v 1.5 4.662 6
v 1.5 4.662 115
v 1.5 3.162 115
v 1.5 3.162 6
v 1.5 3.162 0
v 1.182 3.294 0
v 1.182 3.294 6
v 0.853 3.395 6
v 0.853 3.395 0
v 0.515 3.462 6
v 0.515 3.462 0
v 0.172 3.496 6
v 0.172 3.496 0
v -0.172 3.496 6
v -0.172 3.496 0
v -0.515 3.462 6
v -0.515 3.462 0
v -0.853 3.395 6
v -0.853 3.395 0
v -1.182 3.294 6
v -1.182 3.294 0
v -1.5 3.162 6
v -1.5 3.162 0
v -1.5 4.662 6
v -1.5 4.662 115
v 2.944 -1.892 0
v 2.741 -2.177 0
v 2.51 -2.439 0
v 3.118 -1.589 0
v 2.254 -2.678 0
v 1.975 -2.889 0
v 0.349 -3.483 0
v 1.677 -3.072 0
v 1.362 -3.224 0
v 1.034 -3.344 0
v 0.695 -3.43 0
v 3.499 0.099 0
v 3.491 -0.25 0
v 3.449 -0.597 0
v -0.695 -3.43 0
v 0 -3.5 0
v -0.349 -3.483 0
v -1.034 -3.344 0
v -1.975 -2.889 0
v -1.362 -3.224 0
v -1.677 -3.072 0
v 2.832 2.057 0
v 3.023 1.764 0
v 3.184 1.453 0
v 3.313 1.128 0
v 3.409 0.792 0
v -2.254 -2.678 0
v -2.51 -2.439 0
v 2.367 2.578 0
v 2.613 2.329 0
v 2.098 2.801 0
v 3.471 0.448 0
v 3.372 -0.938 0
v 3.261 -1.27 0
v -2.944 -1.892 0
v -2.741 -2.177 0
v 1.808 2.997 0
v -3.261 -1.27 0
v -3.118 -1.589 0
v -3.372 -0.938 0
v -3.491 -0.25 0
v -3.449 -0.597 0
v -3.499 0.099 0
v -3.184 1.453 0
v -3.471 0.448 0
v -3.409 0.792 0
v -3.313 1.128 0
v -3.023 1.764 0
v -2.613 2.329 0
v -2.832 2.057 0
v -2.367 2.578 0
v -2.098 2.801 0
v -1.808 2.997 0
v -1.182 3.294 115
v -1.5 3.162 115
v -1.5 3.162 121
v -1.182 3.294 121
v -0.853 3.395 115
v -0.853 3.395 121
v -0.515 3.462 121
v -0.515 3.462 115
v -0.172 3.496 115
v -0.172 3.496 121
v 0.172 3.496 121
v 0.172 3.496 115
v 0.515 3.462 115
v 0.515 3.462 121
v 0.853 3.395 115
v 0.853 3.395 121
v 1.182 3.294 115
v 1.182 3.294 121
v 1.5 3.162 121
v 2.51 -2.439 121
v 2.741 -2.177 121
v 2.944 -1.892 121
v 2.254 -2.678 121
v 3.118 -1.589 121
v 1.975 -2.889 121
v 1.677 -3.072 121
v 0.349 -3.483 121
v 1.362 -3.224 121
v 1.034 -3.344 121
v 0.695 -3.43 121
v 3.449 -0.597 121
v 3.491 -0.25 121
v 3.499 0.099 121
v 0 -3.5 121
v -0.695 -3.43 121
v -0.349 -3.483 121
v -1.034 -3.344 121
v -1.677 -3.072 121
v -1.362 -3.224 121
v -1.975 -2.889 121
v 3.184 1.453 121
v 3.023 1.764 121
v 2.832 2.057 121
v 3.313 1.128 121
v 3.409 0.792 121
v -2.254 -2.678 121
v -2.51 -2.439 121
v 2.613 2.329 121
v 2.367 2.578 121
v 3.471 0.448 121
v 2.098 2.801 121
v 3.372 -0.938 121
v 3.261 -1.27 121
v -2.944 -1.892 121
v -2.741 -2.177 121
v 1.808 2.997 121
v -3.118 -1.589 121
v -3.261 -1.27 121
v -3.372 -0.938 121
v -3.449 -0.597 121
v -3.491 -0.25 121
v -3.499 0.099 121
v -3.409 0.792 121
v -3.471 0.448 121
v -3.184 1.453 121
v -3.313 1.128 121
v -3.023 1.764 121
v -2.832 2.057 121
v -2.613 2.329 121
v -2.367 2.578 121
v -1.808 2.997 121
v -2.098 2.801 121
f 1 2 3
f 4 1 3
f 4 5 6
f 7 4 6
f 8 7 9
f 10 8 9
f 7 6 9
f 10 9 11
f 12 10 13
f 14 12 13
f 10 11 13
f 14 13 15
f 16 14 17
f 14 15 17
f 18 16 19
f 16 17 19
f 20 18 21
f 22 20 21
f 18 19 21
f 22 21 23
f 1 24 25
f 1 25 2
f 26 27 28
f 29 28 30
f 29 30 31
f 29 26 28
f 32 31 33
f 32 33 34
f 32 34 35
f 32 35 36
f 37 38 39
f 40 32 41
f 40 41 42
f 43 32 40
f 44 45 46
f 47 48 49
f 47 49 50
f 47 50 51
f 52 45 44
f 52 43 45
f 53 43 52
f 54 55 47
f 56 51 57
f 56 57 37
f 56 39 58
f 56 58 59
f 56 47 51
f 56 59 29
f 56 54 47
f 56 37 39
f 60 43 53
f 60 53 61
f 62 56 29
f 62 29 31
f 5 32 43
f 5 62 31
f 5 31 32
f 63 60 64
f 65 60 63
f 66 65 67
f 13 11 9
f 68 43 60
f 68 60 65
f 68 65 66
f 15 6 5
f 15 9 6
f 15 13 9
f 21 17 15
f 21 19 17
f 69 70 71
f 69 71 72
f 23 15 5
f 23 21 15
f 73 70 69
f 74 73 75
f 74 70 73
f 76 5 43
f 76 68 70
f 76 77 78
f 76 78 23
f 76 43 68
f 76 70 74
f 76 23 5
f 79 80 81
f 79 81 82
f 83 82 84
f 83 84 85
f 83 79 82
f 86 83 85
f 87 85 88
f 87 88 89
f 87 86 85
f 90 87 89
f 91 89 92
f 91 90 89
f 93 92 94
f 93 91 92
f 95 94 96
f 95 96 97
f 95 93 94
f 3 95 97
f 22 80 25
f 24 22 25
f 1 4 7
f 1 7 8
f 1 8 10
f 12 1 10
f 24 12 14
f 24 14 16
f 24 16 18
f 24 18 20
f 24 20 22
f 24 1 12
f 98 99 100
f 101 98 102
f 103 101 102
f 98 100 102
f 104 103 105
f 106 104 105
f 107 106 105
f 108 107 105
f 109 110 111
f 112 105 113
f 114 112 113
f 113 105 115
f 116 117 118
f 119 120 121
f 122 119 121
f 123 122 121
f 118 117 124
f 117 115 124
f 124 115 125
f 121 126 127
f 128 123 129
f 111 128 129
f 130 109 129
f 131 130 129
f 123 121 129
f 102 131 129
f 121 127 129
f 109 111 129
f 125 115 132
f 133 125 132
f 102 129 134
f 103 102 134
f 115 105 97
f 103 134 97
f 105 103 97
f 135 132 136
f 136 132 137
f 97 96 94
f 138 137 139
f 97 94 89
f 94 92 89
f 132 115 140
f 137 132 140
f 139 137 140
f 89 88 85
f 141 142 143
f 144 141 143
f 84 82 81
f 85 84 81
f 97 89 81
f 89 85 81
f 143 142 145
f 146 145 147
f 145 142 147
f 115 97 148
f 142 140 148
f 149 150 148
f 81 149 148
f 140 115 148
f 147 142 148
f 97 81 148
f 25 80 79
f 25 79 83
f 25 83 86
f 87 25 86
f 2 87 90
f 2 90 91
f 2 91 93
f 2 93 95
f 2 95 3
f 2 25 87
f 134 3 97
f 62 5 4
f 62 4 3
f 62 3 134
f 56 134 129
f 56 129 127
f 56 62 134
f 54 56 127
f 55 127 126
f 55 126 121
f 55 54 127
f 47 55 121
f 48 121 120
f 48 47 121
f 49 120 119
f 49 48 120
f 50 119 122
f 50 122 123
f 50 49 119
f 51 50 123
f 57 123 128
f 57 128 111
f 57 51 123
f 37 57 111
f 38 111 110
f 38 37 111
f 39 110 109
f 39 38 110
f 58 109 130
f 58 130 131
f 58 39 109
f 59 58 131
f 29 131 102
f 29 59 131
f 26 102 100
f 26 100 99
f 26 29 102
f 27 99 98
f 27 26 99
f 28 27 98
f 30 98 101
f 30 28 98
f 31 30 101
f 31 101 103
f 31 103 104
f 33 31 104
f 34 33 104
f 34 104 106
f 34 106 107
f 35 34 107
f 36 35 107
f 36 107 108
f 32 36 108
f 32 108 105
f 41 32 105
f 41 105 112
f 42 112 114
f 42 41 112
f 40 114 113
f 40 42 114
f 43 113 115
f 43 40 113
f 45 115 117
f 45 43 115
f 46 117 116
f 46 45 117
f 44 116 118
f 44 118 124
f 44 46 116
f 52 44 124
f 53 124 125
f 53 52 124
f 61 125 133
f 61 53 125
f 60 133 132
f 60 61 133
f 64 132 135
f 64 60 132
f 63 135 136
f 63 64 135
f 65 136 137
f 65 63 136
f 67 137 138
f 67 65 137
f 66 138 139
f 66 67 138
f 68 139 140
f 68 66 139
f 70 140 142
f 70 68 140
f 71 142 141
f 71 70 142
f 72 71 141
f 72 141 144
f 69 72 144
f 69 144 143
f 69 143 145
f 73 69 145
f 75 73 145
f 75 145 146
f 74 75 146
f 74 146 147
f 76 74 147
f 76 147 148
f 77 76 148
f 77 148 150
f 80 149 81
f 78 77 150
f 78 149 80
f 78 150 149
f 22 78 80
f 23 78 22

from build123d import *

# Parameters (mm, degrees)
BOSS_EXTRU_1_DEPTH      = 121
ENL_V_START             = -6
ENL_V_MAT_EXTRU_1_DEPTH = 6
ENL_V_MAT_EXTRU_2_DEPTH = 6


with BuildPart() as part:
    # Esquisse1 → Boss.-Extru.1 (new body)
    with BuildSketch(Plane.XY):
        with BuildLine():
            Line((-1.5, 3.16227766), (-1.5, 4.66227766))
            Line((-1.5, 4.66227766), (1.5, 4.66227766))
            Line((1.5, 4.66227766), (1.5, 3.16227766))
            ThreePointArc((1.5, 3.16227766), (0, -3.5), (-1.5, 3.16227766))
        make_face()
    extrude(amount=BOSS_EXTRU_1_DEPTH)

    # Esquisse2 → Enlèv. mat.-Extru.1 (cut)
    with BuildSketch(Plane.XY.offset(121).offset(ENL_V_START)):
        with BuildLine():
            ThreePointArc((-1.5, 3.16227766), (0, 3.5), (1.5, 3.16227766))
            Line((1.5, 3.16227766), (1.5, 4.66227766))
            Line((1.5, 4.66227766), (-1.5, 4.66227766))
            Line((-1.5, 4.66227766), (-1.5, 3.16227766))
        make_face()
    extrude(amount=ENL_V_MAT_EXTRU_1_DEPTH, mode=Mode.SUBTRACT)

    # Esquisse3 → Enlèv. mat.-Extru.2 (cut)
    with BuildSketch(Plane(origin=(0, 0, 0), x_dir=(-1, 0, 0), z_dir=(0, 0, -1))):
        with BuildLine():
            Line((-1.5, 4.66227766), (-1.5, 3.16227766))
            ThreePointArc((-1.5, 3.16227766), (0, 3.5), (1.5, 3.16227766))
            Line((1.5, 3.16227766), (1.5, 4.66227766))
            Line((1.5, 4.66227766), (-1.5, 4.66227766))
        make_face()
    extrude(amount=-ENL_V_MAT_EXTRU_2_DEPTH, mode=Mode.SUBTRACT)


solid = part.part
